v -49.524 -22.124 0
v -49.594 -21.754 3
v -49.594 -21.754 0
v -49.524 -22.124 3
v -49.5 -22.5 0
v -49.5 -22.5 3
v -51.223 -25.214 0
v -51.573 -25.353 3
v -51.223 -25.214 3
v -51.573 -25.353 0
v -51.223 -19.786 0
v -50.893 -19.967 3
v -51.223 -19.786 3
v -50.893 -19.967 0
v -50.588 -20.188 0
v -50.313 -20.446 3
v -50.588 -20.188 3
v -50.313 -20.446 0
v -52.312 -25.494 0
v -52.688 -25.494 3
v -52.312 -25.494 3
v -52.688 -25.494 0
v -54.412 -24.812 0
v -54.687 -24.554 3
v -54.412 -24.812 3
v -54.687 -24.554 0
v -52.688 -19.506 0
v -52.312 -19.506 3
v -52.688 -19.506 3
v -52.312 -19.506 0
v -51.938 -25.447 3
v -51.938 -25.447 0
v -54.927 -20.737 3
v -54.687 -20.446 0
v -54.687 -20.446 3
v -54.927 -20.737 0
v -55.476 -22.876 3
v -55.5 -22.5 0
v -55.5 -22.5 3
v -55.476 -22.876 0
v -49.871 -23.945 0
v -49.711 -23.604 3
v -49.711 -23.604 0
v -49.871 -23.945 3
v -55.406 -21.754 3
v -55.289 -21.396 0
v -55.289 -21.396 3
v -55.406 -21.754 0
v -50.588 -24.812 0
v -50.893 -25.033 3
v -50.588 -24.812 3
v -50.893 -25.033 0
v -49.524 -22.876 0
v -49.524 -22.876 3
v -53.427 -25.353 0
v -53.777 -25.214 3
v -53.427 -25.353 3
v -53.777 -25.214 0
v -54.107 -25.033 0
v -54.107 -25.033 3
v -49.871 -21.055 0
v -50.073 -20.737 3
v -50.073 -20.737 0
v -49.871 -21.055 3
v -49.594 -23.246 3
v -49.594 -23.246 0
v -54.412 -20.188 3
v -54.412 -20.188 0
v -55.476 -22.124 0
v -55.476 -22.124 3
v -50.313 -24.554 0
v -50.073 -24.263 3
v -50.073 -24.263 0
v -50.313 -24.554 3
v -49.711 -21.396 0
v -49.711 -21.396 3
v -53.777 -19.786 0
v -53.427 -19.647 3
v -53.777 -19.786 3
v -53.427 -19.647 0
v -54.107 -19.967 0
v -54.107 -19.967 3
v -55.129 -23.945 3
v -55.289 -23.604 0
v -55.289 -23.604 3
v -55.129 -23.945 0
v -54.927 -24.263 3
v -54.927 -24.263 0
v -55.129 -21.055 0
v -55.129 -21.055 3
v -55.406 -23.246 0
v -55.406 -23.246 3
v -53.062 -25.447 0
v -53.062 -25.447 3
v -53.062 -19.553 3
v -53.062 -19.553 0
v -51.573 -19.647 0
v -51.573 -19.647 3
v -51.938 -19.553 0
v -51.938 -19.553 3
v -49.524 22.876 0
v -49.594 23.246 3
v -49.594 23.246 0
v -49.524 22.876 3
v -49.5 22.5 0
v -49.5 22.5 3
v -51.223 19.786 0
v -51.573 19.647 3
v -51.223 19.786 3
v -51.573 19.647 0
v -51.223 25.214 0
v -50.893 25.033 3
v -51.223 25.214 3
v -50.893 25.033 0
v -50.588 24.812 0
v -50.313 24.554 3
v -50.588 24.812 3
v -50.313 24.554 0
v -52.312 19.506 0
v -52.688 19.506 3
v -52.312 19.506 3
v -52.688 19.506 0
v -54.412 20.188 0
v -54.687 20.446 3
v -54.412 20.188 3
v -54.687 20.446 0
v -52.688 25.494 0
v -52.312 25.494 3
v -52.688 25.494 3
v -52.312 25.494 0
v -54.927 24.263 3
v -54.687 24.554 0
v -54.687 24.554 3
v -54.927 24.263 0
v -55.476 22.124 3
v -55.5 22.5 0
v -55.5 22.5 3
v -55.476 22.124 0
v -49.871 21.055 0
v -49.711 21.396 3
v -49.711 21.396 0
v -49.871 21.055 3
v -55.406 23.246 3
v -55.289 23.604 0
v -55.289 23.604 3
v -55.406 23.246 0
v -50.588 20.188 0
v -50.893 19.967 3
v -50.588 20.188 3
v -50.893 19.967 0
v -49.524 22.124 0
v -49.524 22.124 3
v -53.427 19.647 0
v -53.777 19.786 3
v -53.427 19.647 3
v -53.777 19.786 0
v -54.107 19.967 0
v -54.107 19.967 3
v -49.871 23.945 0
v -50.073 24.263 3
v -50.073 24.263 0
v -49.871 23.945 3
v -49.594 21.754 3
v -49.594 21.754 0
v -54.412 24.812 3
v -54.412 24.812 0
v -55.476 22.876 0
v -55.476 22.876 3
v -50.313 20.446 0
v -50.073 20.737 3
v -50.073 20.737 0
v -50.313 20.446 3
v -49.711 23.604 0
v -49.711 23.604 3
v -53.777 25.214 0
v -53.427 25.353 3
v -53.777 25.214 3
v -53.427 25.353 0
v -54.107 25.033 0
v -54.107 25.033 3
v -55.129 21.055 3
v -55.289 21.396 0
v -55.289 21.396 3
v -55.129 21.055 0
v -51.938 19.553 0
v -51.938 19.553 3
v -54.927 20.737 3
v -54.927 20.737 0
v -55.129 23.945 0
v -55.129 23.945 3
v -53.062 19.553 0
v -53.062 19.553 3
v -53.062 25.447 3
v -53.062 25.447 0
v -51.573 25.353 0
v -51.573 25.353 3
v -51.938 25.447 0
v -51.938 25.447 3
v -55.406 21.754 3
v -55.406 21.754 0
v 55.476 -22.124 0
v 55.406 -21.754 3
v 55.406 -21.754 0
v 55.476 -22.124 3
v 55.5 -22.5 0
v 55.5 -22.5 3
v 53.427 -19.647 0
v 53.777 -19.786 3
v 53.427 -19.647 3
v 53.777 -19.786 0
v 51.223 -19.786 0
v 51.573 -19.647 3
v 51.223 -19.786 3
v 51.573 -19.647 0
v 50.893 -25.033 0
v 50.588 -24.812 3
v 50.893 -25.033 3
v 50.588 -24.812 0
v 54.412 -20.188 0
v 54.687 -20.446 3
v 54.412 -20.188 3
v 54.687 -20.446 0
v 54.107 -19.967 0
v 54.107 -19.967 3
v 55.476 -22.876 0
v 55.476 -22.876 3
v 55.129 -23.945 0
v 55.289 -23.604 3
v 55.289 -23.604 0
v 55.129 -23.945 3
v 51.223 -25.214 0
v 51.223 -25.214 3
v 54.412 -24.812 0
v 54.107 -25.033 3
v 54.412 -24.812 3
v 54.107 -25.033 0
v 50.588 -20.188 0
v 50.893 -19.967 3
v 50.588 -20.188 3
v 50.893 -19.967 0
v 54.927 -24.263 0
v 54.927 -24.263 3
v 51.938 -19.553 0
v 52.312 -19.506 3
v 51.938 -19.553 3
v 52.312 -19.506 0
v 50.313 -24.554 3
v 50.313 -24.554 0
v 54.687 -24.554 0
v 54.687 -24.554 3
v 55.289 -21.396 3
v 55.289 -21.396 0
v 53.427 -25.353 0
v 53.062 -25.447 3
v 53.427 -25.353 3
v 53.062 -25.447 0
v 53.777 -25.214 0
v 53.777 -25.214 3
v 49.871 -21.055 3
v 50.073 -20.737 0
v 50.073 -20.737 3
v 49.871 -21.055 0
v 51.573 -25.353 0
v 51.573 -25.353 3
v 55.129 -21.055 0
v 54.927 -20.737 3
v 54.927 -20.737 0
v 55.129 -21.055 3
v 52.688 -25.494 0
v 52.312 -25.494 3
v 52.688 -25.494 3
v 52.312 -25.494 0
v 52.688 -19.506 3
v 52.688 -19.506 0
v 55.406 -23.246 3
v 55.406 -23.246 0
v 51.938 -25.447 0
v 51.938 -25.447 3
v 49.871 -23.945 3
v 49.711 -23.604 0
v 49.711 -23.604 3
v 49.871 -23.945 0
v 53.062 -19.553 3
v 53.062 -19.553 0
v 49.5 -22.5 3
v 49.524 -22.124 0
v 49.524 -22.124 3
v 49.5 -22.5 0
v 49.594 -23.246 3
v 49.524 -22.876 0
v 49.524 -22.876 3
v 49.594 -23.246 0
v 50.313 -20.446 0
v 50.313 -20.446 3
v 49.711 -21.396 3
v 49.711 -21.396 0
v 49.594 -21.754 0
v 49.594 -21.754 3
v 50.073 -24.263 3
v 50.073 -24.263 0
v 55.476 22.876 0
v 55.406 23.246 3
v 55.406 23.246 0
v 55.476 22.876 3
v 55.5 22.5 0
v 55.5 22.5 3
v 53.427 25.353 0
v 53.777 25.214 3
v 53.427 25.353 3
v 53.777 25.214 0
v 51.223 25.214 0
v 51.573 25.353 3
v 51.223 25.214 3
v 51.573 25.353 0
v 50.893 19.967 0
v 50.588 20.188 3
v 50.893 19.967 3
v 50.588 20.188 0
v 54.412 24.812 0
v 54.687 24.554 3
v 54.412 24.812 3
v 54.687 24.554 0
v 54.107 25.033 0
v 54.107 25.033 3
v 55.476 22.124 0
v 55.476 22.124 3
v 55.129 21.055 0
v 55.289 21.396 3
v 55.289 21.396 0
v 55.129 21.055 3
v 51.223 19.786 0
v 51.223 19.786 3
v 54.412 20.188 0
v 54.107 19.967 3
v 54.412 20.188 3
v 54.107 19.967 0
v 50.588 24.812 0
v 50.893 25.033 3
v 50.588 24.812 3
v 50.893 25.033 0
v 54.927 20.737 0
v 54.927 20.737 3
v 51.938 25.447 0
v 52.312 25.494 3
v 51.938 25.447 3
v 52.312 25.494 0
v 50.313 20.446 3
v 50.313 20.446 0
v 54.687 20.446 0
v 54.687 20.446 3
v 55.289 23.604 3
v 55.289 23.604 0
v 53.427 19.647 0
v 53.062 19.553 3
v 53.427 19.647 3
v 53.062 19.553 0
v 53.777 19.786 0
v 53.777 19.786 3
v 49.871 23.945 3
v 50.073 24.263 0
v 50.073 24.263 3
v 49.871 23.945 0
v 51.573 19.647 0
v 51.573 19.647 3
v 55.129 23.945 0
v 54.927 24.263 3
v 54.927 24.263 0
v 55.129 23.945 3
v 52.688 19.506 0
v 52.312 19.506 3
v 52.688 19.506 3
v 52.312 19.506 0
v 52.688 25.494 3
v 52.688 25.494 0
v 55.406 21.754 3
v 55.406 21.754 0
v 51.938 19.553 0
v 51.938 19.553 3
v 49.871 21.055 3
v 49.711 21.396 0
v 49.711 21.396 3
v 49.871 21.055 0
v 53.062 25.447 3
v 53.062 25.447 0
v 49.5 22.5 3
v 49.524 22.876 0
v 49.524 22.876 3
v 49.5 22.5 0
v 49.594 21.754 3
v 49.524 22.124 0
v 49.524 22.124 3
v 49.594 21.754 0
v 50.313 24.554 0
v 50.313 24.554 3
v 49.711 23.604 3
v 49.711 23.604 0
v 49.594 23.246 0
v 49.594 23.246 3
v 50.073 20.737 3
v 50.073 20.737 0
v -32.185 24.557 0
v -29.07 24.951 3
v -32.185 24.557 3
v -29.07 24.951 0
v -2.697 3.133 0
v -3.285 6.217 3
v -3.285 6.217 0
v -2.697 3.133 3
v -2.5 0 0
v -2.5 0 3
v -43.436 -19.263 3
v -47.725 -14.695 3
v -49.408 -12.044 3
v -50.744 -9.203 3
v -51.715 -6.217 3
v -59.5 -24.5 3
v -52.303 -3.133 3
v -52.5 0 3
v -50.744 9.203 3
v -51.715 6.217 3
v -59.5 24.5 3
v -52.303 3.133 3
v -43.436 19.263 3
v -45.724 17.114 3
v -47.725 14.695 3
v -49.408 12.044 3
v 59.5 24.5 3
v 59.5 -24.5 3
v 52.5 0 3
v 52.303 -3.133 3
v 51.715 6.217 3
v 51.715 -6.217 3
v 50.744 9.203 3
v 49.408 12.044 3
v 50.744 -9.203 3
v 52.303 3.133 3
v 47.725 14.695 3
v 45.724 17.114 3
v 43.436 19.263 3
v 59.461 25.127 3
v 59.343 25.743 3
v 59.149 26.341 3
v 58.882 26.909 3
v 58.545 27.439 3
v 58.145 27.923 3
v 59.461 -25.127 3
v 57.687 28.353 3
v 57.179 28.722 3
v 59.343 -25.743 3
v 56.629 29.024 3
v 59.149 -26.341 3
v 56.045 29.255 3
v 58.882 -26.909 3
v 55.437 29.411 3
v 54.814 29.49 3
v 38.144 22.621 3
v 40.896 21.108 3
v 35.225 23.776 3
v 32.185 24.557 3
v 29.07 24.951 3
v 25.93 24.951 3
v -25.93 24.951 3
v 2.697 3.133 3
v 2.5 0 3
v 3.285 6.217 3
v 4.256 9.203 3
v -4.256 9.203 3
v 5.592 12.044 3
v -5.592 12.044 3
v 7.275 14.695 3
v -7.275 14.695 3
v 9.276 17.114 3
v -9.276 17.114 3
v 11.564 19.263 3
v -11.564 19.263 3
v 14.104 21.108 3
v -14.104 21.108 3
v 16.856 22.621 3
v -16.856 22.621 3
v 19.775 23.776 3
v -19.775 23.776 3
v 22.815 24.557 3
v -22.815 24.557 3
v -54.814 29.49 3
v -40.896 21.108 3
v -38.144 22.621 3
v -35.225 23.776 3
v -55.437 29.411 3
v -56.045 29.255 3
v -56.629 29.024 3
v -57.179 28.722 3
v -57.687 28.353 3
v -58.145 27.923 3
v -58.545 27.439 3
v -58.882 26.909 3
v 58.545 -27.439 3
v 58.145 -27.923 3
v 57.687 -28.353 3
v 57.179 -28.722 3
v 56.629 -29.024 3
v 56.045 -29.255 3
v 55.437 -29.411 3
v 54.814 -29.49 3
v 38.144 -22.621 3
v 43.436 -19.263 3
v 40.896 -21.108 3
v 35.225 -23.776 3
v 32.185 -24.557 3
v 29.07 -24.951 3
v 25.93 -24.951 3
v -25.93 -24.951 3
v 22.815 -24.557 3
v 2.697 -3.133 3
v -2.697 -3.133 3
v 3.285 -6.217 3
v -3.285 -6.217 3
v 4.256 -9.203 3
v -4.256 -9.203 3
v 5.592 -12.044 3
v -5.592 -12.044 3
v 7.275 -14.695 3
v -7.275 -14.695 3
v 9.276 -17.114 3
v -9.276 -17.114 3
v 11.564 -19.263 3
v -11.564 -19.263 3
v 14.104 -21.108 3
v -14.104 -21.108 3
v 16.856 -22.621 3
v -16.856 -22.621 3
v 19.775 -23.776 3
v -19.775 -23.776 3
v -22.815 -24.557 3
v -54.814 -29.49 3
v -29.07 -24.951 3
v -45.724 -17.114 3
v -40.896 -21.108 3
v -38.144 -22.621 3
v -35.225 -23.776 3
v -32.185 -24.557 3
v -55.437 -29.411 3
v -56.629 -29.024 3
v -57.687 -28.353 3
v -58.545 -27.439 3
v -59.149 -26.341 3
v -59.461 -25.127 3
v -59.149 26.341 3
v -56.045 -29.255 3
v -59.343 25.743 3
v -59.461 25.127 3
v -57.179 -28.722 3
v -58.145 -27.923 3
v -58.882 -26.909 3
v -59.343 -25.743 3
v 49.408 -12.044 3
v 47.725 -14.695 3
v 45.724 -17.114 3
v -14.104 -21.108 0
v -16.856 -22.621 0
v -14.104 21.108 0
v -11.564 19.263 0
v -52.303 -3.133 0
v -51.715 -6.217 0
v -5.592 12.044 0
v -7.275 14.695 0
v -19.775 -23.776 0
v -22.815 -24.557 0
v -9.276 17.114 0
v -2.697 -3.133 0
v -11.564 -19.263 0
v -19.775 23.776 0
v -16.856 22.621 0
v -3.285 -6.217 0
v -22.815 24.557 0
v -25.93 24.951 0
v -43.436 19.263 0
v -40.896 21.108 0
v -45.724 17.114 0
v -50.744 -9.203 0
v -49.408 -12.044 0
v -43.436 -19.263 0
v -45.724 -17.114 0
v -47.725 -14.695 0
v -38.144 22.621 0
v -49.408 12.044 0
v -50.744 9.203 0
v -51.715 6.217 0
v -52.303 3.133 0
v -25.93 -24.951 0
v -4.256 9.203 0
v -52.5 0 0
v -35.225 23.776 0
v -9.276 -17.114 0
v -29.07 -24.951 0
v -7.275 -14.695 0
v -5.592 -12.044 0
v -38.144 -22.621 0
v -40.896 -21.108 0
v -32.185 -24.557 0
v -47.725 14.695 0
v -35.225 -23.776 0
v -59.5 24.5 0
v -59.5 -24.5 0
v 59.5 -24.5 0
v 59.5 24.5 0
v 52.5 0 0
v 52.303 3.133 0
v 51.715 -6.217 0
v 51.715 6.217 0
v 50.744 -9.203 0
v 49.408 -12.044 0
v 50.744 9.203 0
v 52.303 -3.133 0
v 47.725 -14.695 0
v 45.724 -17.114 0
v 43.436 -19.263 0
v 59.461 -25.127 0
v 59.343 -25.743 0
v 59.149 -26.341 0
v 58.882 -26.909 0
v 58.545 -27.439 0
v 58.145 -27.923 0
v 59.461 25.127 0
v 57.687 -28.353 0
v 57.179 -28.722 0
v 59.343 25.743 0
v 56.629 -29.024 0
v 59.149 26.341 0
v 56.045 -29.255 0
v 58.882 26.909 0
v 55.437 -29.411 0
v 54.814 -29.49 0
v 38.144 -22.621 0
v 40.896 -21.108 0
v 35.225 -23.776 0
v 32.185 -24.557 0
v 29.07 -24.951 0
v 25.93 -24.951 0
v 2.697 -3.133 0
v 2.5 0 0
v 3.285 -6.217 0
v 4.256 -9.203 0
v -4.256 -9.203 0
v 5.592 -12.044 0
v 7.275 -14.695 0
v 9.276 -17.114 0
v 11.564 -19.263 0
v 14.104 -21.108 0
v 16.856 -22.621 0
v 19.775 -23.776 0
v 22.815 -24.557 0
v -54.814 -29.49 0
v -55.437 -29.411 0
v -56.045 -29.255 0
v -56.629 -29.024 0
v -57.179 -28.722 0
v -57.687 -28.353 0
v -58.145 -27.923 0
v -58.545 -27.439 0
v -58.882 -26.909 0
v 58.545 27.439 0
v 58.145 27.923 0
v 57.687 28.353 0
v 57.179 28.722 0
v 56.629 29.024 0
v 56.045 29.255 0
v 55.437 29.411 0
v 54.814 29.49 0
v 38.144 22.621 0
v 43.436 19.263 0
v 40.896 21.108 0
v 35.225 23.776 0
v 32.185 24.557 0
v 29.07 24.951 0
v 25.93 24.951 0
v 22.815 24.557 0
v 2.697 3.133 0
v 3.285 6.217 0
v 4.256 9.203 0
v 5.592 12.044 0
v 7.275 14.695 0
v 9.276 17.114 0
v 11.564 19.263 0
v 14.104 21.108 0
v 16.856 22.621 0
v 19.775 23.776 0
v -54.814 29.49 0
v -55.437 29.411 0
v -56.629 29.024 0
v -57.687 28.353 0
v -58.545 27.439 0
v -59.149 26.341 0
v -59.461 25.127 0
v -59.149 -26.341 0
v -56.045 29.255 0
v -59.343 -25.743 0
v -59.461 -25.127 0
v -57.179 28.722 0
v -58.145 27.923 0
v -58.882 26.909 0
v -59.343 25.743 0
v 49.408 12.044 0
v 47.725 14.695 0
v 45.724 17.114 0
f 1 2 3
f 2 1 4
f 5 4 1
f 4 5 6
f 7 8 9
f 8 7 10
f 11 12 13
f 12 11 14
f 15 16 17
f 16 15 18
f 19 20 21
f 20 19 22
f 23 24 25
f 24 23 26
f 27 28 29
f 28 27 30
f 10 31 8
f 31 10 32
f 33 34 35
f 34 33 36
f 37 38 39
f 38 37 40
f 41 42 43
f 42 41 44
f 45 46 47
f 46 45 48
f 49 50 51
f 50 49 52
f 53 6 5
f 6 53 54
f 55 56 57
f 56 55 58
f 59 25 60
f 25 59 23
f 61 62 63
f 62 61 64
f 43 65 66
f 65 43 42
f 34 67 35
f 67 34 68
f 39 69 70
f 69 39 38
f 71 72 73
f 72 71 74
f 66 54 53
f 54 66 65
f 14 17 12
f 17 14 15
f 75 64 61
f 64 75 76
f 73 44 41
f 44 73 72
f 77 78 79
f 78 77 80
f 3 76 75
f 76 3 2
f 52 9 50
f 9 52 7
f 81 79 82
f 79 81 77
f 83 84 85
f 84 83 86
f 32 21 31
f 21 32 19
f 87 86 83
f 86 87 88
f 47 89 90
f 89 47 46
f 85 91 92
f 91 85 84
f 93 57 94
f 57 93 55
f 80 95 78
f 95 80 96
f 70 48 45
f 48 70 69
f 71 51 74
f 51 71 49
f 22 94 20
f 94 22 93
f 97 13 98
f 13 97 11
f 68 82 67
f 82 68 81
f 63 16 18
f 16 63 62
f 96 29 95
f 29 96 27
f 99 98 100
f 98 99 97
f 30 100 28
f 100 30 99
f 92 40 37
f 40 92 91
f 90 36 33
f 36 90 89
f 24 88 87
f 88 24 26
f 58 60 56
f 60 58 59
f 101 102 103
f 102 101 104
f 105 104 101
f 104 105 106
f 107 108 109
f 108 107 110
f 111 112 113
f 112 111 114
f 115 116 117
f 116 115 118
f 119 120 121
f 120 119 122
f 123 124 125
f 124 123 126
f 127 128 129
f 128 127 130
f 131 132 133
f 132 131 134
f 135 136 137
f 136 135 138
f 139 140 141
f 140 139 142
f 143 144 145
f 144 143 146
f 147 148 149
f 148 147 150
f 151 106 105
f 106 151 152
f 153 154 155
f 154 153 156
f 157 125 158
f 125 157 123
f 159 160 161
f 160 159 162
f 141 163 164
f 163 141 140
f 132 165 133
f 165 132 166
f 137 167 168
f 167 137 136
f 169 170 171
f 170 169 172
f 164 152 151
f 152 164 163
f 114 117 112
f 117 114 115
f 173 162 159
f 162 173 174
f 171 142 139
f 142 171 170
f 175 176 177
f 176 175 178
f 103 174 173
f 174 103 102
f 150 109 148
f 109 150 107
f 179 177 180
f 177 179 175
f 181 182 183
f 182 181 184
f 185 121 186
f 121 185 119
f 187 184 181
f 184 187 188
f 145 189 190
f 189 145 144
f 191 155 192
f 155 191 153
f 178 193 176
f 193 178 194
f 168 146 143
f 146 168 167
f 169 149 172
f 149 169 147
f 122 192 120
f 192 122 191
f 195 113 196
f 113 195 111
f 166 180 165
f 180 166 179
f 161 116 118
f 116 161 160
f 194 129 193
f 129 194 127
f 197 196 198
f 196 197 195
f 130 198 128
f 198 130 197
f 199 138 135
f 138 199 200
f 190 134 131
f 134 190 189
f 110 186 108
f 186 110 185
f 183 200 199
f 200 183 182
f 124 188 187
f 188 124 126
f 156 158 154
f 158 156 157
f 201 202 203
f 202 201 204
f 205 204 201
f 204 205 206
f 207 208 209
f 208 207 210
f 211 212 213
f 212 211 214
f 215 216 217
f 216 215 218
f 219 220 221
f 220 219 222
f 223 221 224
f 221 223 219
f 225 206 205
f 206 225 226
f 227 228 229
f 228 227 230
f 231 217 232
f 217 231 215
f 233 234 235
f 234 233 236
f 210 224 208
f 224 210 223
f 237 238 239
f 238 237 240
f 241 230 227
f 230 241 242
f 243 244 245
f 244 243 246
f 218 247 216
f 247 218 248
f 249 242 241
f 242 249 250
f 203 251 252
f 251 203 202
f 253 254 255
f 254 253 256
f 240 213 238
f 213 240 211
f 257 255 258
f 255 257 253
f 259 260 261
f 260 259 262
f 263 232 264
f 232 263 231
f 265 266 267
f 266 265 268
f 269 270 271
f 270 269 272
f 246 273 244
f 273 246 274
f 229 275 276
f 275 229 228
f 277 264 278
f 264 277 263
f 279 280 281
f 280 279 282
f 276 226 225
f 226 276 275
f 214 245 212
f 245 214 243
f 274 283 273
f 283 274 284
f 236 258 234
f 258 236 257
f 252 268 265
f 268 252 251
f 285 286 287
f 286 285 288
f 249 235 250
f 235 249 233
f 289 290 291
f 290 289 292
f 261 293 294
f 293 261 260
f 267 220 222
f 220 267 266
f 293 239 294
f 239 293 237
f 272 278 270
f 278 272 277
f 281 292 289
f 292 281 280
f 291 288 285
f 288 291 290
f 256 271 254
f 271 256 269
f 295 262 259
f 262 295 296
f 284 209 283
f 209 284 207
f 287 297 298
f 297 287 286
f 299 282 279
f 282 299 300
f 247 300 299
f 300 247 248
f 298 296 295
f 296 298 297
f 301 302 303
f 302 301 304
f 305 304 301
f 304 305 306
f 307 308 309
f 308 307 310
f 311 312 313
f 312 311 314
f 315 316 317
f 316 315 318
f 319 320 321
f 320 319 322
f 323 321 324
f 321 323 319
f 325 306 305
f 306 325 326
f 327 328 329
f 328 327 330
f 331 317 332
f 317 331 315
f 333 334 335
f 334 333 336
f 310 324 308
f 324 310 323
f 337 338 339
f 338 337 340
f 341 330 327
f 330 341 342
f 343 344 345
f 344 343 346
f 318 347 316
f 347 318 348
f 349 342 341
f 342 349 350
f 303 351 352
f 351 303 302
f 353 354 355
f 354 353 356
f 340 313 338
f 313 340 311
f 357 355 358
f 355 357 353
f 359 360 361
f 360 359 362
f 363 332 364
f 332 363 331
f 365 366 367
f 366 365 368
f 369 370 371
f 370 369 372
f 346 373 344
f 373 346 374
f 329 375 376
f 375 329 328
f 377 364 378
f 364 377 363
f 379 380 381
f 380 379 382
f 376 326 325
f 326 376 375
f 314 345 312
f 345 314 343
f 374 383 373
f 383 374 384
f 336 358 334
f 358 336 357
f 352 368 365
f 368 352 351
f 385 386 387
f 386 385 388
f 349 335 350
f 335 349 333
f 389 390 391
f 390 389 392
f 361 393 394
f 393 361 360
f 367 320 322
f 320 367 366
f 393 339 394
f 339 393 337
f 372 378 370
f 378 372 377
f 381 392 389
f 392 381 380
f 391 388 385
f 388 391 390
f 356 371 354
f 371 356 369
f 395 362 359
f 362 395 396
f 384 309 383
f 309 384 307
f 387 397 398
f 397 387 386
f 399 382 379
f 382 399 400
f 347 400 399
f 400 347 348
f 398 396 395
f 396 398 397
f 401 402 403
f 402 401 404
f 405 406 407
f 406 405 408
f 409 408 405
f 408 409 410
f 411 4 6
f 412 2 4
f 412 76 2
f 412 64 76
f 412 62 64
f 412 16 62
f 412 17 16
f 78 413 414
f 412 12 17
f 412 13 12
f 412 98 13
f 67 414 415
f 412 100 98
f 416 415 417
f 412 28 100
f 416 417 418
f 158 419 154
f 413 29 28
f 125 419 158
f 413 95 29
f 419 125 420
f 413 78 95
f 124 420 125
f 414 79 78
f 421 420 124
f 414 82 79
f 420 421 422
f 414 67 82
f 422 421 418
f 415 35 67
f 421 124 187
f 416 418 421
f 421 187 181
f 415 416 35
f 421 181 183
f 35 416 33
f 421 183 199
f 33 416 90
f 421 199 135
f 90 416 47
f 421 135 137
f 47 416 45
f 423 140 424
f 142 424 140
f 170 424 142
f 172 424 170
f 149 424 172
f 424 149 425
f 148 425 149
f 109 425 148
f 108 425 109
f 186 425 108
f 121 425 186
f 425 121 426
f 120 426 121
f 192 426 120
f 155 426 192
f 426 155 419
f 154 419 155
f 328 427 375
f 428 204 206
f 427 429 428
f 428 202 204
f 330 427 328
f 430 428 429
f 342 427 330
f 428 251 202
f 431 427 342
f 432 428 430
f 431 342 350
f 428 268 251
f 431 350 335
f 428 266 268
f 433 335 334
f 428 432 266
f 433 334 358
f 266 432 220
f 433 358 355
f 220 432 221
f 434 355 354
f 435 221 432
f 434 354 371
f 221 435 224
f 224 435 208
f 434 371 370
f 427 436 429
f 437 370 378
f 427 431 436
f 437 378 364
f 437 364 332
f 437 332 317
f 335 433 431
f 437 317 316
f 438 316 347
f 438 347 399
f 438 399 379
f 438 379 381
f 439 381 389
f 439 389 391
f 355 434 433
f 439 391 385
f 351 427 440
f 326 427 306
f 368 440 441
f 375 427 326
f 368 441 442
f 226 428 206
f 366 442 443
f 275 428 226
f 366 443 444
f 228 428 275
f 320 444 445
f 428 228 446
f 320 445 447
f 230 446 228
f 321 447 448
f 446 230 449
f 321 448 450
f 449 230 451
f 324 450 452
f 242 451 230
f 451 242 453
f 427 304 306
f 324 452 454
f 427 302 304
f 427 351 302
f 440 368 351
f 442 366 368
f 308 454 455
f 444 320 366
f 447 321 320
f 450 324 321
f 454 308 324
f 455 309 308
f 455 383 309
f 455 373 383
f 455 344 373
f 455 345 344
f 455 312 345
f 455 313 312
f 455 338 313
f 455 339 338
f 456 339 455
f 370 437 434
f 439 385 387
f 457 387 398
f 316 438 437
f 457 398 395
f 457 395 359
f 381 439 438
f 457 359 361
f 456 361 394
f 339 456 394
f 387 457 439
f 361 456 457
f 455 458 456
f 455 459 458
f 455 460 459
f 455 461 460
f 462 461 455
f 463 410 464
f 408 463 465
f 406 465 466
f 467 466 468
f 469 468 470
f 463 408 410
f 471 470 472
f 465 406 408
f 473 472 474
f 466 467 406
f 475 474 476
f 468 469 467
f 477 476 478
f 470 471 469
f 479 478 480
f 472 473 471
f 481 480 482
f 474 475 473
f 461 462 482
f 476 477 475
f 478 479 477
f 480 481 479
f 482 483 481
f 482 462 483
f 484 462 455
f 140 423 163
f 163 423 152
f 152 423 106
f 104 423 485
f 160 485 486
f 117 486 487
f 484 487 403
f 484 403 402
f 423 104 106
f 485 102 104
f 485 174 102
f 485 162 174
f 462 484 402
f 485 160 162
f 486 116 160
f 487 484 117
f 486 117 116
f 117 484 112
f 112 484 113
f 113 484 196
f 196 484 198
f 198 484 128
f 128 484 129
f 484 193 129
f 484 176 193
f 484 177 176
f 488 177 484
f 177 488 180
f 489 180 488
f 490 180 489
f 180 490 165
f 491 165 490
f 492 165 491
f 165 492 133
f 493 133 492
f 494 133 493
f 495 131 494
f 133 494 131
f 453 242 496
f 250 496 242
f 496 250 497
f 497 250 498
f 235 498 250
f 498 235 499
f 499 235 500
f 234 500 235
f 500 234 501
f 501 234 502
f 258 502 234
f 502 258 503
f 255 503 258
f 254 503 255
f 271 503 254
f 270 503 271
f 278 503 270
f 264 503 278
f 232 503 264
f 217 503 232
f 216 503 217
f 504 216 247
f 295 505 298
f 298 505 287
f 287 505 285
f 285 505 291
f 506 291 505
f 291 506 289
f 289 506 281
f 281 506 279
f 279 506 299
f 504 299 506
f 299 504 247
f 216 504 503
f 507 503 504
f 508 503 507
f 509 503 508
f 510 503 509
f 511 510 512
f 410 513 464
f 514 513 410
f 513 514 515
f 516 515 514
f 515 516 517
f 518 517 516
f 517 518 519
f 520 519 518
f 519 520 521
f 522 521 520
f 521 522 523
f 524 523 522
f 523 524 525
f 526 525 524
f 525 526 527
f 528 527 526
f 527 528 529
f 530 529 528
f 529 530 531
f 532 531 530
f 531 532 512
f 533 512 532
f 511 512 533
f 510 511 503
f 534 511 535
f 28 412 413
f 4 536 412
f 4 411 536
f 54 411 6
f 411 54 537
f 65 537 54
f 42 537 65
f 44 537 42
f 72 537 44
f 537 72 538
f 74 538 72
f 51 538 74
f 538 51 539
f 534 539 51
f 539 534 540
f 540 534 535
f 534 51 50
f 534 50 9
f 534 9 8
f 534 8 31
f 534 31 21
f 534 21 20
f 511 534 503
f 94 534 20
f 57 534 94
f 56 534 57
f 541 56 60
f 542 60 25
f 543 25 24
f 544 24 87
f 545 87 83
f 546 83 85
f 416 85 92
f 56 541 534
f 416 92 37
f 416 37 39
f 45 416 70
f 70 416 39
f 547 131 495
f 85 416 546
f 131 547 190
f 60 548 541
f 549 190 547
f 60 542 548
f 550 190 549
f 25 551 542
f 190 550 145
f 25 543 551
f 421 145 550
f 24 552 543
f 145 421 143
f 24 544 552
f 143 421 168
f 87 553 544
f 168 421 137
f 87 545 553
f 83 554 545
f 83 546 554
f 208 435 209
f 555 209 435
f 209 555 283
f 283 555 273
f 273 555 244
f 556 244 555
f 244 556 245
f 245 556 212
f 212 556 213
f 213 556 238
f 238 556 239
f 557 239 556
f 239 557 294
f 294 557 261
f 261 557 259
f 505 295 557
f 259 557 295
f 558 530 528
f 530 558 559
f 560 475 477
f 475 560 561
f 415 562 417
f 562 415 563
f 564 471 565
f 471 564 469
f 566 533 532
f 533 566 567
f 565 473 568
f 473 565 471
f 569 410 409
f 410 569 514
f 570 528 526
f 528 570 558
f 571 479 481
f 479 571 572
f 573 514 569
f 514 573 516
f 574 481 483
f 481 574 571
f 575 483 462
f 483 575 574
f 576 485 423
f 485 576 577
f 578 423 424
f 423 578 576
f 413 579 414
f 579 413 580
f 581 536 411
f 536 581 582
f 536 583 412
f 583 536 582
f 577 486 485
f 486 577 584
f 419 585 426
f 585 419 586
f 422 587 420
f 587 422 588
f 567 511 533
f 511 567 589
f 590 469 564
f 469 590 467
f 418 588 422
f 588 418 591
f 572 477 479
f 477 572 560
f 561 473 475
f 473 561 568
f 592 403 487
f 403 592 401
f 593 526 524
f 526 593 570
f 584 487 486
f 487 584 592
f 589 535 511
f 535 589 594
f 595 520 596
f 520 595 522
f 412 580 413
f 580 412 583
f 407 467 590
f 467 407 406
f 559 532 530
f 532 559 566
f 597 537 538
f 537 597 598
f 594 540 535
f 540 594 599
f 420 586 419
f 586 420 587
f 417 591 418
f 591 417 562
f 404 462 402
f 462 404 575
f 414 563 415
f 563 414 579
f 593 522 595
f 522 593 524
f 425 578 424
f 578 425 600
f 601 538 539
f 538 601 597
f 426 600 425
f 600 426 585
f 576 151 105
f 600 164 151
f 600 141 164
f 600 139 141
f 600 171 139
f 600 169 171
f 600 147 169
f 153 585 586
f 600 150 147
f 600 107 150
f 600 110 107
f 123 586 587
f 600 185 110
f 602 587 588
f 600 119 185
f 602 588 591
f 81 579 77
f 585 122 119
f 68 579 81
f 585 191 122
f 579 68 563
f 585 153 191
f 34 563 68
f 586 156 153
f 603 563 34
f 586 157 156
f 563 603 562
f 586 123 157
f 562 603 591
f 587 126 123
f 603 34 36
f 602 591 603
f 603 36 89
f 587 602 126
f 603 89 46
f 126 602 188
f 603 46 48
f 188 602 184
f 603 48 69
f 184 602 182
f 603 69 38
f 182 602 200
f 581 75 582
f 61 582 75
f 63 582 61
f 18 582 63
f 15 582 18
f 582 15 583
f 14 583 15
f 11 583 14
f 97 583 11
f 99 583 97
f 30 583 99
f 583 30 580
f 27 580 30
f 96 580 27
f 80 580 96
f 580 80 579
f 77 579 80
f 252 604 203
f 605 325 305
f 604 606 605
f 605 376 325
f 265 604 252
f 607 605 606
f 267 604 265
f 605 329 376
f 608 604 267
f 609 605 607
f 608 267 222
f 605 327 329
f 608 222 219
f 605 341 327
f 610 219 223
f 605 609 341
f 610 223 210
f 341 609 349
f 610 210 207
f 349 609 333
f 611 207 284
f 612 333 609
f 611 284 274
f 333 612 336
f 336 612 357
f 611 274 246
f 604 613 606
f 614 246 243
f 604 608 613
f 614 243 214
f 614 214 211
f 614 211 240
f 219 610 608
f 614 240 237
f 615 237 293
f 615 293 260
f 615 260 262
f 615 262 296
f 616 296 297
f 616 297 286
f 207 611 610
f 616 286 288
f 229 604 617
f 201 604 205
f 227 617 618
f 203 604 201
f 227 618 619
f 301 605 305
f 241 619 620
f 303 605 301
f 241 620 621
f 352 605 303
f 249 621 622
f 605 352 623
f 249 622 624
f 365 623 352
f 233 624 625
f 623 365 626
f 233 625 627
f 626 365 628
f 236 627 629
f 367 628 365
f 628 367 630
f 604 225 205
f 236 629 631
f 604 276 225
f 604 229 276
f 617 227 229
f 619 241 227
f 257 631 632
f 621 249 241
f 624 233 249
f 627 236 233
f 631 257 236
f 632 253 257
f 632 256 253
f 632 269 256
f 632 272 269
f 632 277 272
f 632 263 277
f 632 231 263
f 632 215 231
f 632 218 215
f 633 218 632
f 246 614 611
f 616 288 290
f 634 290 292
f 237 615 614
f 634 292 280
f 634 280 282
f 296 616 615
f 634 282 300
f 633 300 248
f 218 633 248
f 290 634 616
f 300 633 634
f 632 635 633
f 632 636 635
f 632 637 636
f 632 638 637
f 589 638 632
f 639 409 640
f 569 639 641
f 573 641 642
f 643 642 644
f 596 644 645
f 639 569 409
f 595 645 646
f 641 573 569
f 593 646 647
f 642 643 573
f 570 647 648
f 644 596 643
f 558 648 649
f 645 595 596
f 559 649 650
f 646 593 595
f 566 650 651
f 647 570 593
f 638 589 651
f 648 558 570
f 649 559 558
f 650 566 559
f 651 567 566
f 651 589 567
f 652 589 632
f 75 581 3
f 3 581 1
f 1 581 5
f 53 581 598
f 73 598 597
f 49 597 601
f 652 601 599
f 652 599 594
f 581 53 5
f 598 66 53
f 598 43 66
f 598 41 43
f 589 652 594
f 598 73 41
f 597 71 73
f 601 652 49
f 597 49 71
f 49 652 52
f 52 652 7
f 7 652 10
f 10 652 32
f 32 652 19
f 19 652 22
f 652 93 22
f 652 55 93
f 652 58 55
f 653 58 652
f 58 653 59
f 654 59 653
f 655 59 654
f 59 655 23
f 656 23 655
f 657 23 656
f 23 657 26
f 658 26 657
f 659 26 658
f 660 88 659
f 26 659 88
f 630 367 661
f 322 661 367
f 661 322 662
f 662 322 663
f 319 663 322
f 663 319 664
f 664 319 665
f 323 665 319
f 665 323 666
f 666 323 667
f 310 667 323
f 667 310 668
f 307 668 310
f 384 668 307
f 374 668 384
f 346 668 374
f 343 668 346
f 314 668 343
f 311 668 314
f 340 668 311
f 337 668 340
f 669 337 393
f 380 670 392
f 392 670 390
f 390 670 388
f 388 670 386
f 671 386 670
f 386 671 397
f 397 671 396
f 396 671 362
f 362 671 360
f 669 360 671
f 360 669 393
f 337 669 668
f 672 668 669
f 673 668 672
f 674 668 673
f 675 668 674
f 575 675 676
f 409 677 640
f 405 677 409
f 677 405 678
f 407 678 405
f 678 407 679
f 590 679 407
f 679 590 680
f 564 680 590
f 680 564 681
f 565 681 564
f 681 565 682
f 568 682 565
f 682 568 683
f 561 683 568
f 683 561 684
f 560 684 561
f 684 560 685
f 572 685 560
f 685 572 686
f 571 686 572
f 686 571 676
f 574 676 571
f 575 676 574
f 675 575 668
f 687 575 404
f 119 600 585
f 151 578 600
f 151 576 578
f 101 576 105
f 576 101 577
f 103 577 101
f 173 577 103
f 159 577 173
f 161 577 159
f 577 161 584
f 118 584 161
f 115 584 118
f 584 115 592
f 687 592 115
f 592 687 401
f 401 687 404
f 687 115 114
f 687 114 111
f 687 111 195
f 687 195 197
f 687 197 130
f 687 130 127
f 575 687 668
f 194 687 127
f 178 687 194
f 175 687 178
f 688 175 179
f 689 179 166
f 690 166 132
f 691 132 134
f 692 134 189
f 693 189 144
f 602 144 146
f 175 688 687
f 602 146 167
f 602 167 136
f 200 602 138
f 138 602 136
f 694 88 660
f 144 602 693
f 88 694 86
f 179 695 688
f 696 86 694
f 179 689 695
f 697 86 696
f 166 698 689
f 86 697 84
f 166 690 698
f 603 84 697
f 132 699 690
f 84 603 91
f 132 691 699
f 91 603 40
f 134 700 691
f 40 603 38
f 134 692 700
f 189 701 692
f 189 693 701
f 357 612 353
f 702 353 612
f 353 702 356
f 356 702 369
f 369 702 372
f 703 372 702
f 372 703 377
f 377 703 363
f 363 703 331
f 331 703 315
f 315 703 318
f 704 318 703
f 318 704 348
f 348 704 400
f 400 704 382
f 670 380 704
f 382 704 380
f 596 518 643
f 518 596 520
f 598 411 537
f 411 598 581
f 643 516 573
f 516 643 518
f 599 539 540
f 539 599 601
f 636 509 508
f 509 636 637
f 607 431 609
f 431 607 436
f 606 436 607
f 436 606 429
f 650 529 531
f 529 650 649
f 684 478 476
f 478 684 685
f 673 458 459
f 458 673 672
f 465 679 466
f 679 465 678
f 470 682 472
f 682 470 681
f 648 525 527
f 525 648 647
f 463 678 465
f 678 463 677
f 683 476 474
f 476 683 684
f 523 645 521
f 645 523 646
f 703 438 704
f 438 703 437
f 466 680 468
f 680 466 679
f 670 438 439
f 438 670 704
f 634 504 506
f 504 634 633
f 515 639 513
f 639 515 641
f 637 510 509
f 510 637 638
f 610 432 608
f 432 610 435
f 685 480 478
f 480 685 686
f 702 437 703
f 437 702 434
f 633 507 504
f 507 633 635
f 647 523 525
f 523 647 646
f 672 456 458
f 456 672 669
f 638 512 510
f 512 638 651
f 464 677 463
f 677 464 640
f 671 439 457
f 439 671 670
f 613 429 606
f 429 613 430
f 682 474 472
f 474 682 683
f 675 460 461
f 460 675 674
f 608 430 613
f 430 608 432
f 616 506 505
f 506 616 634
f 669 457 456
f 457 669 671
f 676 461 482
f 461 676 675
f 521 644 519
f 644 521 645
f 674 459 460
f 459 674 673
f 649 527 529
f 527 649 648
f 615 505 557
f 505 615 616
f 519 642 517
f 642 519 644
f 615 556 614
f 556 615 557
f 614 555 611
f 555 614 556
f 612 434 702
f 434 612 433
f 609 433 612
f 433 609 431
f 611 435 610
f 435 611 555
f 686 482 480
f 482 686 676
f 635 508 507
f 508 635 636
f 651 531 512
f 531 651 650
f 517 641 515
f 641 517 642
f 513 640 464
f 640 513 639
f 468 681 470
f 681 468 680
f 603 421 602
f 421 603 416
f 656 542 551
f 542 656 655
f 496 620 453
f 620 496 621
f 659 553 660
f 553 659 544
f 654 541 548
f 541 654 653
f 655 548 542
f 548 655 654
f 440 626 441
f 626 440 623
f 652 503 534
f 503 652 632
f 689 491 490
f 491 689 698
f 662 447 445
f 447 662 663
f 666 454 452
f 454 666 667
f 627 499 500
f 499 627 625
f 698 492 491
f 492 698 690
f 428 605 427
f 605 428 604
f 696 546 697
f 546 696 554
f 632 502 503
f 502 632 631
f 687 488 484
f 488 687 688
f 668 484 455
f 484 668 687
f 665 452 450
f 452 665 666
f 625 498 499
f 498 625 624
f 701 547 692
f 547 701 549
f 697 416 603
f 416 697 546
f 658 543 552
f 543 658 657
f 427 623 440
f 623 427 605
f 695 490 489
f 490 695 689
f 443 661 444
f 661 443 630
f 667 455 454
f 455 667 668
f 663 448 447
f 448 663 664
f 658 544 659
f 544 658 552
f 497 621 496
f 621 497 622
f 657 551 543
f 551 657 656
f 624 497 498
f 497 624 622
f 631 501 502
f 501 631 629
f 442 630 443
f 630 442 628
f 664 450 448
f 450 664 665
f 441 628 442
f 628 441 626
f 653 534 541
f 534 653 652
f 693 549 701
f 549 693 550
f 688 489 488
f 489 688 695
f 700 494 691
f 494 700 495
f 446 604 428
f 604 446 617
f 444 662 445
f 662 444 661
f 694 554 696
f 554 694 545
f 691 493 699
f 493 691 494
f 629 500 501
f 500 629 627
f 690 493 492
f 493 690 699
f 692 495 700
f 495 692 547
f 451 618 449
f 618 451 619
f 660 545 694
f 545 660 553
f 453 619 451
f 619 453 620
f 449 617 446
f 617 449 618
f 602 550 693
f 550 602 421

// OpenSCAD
$fn = 50;


difference() {
	union() {
		hull() {
			translate(v = [-54.5000000000, 24.5000000000, 0]) {
				cylinder(h = 3, r = 5);
			}
			translate(v = [54.5000000000, 24.5000000000, 0]) {
				cylinder(h = 3, r = 5);
			}
			translate(v = [-54.5000000000, -24.5000000000, 0]) {
				cylinder(h = 3, r = 5);
			}
			translate(v = [54.5000000000, -24.5000000000, 0]) {
				cylinder(h = 3, r = 5);
			}
		}
	}
	union() {
		#translate(v = [-52.5000000000, -22.5000000000, -100.0000000000]) {
			cylinder(h = 200, r = 3.0000000000);
		}
		#translate(v = [-52.5000000000, 22.5000000000, -100.0000000000]) {
			cylinder(h = 200, r = 3.0000000000);
		}
		#translate(v = [52.5000000000, -22.5000000000, -100.0000000000]) {
			cylinder(h = 200, r = 3.0000000000);
		}
		#translate(v = [52.5000000000, 22.5000000000, -100.0000000000]) {
			cylinder(h = 200, r = 3.0000000000);
		}
		#translate(v = [-27.5000000000, 0, 0]) {
			cylinder(h = 3, r = 25.0000000000);
		}
		#translate(v = [27.5000000000, 0, 0]) {
			cylinder(h = 3, r = 25.0000000000);
		}
	}
}
